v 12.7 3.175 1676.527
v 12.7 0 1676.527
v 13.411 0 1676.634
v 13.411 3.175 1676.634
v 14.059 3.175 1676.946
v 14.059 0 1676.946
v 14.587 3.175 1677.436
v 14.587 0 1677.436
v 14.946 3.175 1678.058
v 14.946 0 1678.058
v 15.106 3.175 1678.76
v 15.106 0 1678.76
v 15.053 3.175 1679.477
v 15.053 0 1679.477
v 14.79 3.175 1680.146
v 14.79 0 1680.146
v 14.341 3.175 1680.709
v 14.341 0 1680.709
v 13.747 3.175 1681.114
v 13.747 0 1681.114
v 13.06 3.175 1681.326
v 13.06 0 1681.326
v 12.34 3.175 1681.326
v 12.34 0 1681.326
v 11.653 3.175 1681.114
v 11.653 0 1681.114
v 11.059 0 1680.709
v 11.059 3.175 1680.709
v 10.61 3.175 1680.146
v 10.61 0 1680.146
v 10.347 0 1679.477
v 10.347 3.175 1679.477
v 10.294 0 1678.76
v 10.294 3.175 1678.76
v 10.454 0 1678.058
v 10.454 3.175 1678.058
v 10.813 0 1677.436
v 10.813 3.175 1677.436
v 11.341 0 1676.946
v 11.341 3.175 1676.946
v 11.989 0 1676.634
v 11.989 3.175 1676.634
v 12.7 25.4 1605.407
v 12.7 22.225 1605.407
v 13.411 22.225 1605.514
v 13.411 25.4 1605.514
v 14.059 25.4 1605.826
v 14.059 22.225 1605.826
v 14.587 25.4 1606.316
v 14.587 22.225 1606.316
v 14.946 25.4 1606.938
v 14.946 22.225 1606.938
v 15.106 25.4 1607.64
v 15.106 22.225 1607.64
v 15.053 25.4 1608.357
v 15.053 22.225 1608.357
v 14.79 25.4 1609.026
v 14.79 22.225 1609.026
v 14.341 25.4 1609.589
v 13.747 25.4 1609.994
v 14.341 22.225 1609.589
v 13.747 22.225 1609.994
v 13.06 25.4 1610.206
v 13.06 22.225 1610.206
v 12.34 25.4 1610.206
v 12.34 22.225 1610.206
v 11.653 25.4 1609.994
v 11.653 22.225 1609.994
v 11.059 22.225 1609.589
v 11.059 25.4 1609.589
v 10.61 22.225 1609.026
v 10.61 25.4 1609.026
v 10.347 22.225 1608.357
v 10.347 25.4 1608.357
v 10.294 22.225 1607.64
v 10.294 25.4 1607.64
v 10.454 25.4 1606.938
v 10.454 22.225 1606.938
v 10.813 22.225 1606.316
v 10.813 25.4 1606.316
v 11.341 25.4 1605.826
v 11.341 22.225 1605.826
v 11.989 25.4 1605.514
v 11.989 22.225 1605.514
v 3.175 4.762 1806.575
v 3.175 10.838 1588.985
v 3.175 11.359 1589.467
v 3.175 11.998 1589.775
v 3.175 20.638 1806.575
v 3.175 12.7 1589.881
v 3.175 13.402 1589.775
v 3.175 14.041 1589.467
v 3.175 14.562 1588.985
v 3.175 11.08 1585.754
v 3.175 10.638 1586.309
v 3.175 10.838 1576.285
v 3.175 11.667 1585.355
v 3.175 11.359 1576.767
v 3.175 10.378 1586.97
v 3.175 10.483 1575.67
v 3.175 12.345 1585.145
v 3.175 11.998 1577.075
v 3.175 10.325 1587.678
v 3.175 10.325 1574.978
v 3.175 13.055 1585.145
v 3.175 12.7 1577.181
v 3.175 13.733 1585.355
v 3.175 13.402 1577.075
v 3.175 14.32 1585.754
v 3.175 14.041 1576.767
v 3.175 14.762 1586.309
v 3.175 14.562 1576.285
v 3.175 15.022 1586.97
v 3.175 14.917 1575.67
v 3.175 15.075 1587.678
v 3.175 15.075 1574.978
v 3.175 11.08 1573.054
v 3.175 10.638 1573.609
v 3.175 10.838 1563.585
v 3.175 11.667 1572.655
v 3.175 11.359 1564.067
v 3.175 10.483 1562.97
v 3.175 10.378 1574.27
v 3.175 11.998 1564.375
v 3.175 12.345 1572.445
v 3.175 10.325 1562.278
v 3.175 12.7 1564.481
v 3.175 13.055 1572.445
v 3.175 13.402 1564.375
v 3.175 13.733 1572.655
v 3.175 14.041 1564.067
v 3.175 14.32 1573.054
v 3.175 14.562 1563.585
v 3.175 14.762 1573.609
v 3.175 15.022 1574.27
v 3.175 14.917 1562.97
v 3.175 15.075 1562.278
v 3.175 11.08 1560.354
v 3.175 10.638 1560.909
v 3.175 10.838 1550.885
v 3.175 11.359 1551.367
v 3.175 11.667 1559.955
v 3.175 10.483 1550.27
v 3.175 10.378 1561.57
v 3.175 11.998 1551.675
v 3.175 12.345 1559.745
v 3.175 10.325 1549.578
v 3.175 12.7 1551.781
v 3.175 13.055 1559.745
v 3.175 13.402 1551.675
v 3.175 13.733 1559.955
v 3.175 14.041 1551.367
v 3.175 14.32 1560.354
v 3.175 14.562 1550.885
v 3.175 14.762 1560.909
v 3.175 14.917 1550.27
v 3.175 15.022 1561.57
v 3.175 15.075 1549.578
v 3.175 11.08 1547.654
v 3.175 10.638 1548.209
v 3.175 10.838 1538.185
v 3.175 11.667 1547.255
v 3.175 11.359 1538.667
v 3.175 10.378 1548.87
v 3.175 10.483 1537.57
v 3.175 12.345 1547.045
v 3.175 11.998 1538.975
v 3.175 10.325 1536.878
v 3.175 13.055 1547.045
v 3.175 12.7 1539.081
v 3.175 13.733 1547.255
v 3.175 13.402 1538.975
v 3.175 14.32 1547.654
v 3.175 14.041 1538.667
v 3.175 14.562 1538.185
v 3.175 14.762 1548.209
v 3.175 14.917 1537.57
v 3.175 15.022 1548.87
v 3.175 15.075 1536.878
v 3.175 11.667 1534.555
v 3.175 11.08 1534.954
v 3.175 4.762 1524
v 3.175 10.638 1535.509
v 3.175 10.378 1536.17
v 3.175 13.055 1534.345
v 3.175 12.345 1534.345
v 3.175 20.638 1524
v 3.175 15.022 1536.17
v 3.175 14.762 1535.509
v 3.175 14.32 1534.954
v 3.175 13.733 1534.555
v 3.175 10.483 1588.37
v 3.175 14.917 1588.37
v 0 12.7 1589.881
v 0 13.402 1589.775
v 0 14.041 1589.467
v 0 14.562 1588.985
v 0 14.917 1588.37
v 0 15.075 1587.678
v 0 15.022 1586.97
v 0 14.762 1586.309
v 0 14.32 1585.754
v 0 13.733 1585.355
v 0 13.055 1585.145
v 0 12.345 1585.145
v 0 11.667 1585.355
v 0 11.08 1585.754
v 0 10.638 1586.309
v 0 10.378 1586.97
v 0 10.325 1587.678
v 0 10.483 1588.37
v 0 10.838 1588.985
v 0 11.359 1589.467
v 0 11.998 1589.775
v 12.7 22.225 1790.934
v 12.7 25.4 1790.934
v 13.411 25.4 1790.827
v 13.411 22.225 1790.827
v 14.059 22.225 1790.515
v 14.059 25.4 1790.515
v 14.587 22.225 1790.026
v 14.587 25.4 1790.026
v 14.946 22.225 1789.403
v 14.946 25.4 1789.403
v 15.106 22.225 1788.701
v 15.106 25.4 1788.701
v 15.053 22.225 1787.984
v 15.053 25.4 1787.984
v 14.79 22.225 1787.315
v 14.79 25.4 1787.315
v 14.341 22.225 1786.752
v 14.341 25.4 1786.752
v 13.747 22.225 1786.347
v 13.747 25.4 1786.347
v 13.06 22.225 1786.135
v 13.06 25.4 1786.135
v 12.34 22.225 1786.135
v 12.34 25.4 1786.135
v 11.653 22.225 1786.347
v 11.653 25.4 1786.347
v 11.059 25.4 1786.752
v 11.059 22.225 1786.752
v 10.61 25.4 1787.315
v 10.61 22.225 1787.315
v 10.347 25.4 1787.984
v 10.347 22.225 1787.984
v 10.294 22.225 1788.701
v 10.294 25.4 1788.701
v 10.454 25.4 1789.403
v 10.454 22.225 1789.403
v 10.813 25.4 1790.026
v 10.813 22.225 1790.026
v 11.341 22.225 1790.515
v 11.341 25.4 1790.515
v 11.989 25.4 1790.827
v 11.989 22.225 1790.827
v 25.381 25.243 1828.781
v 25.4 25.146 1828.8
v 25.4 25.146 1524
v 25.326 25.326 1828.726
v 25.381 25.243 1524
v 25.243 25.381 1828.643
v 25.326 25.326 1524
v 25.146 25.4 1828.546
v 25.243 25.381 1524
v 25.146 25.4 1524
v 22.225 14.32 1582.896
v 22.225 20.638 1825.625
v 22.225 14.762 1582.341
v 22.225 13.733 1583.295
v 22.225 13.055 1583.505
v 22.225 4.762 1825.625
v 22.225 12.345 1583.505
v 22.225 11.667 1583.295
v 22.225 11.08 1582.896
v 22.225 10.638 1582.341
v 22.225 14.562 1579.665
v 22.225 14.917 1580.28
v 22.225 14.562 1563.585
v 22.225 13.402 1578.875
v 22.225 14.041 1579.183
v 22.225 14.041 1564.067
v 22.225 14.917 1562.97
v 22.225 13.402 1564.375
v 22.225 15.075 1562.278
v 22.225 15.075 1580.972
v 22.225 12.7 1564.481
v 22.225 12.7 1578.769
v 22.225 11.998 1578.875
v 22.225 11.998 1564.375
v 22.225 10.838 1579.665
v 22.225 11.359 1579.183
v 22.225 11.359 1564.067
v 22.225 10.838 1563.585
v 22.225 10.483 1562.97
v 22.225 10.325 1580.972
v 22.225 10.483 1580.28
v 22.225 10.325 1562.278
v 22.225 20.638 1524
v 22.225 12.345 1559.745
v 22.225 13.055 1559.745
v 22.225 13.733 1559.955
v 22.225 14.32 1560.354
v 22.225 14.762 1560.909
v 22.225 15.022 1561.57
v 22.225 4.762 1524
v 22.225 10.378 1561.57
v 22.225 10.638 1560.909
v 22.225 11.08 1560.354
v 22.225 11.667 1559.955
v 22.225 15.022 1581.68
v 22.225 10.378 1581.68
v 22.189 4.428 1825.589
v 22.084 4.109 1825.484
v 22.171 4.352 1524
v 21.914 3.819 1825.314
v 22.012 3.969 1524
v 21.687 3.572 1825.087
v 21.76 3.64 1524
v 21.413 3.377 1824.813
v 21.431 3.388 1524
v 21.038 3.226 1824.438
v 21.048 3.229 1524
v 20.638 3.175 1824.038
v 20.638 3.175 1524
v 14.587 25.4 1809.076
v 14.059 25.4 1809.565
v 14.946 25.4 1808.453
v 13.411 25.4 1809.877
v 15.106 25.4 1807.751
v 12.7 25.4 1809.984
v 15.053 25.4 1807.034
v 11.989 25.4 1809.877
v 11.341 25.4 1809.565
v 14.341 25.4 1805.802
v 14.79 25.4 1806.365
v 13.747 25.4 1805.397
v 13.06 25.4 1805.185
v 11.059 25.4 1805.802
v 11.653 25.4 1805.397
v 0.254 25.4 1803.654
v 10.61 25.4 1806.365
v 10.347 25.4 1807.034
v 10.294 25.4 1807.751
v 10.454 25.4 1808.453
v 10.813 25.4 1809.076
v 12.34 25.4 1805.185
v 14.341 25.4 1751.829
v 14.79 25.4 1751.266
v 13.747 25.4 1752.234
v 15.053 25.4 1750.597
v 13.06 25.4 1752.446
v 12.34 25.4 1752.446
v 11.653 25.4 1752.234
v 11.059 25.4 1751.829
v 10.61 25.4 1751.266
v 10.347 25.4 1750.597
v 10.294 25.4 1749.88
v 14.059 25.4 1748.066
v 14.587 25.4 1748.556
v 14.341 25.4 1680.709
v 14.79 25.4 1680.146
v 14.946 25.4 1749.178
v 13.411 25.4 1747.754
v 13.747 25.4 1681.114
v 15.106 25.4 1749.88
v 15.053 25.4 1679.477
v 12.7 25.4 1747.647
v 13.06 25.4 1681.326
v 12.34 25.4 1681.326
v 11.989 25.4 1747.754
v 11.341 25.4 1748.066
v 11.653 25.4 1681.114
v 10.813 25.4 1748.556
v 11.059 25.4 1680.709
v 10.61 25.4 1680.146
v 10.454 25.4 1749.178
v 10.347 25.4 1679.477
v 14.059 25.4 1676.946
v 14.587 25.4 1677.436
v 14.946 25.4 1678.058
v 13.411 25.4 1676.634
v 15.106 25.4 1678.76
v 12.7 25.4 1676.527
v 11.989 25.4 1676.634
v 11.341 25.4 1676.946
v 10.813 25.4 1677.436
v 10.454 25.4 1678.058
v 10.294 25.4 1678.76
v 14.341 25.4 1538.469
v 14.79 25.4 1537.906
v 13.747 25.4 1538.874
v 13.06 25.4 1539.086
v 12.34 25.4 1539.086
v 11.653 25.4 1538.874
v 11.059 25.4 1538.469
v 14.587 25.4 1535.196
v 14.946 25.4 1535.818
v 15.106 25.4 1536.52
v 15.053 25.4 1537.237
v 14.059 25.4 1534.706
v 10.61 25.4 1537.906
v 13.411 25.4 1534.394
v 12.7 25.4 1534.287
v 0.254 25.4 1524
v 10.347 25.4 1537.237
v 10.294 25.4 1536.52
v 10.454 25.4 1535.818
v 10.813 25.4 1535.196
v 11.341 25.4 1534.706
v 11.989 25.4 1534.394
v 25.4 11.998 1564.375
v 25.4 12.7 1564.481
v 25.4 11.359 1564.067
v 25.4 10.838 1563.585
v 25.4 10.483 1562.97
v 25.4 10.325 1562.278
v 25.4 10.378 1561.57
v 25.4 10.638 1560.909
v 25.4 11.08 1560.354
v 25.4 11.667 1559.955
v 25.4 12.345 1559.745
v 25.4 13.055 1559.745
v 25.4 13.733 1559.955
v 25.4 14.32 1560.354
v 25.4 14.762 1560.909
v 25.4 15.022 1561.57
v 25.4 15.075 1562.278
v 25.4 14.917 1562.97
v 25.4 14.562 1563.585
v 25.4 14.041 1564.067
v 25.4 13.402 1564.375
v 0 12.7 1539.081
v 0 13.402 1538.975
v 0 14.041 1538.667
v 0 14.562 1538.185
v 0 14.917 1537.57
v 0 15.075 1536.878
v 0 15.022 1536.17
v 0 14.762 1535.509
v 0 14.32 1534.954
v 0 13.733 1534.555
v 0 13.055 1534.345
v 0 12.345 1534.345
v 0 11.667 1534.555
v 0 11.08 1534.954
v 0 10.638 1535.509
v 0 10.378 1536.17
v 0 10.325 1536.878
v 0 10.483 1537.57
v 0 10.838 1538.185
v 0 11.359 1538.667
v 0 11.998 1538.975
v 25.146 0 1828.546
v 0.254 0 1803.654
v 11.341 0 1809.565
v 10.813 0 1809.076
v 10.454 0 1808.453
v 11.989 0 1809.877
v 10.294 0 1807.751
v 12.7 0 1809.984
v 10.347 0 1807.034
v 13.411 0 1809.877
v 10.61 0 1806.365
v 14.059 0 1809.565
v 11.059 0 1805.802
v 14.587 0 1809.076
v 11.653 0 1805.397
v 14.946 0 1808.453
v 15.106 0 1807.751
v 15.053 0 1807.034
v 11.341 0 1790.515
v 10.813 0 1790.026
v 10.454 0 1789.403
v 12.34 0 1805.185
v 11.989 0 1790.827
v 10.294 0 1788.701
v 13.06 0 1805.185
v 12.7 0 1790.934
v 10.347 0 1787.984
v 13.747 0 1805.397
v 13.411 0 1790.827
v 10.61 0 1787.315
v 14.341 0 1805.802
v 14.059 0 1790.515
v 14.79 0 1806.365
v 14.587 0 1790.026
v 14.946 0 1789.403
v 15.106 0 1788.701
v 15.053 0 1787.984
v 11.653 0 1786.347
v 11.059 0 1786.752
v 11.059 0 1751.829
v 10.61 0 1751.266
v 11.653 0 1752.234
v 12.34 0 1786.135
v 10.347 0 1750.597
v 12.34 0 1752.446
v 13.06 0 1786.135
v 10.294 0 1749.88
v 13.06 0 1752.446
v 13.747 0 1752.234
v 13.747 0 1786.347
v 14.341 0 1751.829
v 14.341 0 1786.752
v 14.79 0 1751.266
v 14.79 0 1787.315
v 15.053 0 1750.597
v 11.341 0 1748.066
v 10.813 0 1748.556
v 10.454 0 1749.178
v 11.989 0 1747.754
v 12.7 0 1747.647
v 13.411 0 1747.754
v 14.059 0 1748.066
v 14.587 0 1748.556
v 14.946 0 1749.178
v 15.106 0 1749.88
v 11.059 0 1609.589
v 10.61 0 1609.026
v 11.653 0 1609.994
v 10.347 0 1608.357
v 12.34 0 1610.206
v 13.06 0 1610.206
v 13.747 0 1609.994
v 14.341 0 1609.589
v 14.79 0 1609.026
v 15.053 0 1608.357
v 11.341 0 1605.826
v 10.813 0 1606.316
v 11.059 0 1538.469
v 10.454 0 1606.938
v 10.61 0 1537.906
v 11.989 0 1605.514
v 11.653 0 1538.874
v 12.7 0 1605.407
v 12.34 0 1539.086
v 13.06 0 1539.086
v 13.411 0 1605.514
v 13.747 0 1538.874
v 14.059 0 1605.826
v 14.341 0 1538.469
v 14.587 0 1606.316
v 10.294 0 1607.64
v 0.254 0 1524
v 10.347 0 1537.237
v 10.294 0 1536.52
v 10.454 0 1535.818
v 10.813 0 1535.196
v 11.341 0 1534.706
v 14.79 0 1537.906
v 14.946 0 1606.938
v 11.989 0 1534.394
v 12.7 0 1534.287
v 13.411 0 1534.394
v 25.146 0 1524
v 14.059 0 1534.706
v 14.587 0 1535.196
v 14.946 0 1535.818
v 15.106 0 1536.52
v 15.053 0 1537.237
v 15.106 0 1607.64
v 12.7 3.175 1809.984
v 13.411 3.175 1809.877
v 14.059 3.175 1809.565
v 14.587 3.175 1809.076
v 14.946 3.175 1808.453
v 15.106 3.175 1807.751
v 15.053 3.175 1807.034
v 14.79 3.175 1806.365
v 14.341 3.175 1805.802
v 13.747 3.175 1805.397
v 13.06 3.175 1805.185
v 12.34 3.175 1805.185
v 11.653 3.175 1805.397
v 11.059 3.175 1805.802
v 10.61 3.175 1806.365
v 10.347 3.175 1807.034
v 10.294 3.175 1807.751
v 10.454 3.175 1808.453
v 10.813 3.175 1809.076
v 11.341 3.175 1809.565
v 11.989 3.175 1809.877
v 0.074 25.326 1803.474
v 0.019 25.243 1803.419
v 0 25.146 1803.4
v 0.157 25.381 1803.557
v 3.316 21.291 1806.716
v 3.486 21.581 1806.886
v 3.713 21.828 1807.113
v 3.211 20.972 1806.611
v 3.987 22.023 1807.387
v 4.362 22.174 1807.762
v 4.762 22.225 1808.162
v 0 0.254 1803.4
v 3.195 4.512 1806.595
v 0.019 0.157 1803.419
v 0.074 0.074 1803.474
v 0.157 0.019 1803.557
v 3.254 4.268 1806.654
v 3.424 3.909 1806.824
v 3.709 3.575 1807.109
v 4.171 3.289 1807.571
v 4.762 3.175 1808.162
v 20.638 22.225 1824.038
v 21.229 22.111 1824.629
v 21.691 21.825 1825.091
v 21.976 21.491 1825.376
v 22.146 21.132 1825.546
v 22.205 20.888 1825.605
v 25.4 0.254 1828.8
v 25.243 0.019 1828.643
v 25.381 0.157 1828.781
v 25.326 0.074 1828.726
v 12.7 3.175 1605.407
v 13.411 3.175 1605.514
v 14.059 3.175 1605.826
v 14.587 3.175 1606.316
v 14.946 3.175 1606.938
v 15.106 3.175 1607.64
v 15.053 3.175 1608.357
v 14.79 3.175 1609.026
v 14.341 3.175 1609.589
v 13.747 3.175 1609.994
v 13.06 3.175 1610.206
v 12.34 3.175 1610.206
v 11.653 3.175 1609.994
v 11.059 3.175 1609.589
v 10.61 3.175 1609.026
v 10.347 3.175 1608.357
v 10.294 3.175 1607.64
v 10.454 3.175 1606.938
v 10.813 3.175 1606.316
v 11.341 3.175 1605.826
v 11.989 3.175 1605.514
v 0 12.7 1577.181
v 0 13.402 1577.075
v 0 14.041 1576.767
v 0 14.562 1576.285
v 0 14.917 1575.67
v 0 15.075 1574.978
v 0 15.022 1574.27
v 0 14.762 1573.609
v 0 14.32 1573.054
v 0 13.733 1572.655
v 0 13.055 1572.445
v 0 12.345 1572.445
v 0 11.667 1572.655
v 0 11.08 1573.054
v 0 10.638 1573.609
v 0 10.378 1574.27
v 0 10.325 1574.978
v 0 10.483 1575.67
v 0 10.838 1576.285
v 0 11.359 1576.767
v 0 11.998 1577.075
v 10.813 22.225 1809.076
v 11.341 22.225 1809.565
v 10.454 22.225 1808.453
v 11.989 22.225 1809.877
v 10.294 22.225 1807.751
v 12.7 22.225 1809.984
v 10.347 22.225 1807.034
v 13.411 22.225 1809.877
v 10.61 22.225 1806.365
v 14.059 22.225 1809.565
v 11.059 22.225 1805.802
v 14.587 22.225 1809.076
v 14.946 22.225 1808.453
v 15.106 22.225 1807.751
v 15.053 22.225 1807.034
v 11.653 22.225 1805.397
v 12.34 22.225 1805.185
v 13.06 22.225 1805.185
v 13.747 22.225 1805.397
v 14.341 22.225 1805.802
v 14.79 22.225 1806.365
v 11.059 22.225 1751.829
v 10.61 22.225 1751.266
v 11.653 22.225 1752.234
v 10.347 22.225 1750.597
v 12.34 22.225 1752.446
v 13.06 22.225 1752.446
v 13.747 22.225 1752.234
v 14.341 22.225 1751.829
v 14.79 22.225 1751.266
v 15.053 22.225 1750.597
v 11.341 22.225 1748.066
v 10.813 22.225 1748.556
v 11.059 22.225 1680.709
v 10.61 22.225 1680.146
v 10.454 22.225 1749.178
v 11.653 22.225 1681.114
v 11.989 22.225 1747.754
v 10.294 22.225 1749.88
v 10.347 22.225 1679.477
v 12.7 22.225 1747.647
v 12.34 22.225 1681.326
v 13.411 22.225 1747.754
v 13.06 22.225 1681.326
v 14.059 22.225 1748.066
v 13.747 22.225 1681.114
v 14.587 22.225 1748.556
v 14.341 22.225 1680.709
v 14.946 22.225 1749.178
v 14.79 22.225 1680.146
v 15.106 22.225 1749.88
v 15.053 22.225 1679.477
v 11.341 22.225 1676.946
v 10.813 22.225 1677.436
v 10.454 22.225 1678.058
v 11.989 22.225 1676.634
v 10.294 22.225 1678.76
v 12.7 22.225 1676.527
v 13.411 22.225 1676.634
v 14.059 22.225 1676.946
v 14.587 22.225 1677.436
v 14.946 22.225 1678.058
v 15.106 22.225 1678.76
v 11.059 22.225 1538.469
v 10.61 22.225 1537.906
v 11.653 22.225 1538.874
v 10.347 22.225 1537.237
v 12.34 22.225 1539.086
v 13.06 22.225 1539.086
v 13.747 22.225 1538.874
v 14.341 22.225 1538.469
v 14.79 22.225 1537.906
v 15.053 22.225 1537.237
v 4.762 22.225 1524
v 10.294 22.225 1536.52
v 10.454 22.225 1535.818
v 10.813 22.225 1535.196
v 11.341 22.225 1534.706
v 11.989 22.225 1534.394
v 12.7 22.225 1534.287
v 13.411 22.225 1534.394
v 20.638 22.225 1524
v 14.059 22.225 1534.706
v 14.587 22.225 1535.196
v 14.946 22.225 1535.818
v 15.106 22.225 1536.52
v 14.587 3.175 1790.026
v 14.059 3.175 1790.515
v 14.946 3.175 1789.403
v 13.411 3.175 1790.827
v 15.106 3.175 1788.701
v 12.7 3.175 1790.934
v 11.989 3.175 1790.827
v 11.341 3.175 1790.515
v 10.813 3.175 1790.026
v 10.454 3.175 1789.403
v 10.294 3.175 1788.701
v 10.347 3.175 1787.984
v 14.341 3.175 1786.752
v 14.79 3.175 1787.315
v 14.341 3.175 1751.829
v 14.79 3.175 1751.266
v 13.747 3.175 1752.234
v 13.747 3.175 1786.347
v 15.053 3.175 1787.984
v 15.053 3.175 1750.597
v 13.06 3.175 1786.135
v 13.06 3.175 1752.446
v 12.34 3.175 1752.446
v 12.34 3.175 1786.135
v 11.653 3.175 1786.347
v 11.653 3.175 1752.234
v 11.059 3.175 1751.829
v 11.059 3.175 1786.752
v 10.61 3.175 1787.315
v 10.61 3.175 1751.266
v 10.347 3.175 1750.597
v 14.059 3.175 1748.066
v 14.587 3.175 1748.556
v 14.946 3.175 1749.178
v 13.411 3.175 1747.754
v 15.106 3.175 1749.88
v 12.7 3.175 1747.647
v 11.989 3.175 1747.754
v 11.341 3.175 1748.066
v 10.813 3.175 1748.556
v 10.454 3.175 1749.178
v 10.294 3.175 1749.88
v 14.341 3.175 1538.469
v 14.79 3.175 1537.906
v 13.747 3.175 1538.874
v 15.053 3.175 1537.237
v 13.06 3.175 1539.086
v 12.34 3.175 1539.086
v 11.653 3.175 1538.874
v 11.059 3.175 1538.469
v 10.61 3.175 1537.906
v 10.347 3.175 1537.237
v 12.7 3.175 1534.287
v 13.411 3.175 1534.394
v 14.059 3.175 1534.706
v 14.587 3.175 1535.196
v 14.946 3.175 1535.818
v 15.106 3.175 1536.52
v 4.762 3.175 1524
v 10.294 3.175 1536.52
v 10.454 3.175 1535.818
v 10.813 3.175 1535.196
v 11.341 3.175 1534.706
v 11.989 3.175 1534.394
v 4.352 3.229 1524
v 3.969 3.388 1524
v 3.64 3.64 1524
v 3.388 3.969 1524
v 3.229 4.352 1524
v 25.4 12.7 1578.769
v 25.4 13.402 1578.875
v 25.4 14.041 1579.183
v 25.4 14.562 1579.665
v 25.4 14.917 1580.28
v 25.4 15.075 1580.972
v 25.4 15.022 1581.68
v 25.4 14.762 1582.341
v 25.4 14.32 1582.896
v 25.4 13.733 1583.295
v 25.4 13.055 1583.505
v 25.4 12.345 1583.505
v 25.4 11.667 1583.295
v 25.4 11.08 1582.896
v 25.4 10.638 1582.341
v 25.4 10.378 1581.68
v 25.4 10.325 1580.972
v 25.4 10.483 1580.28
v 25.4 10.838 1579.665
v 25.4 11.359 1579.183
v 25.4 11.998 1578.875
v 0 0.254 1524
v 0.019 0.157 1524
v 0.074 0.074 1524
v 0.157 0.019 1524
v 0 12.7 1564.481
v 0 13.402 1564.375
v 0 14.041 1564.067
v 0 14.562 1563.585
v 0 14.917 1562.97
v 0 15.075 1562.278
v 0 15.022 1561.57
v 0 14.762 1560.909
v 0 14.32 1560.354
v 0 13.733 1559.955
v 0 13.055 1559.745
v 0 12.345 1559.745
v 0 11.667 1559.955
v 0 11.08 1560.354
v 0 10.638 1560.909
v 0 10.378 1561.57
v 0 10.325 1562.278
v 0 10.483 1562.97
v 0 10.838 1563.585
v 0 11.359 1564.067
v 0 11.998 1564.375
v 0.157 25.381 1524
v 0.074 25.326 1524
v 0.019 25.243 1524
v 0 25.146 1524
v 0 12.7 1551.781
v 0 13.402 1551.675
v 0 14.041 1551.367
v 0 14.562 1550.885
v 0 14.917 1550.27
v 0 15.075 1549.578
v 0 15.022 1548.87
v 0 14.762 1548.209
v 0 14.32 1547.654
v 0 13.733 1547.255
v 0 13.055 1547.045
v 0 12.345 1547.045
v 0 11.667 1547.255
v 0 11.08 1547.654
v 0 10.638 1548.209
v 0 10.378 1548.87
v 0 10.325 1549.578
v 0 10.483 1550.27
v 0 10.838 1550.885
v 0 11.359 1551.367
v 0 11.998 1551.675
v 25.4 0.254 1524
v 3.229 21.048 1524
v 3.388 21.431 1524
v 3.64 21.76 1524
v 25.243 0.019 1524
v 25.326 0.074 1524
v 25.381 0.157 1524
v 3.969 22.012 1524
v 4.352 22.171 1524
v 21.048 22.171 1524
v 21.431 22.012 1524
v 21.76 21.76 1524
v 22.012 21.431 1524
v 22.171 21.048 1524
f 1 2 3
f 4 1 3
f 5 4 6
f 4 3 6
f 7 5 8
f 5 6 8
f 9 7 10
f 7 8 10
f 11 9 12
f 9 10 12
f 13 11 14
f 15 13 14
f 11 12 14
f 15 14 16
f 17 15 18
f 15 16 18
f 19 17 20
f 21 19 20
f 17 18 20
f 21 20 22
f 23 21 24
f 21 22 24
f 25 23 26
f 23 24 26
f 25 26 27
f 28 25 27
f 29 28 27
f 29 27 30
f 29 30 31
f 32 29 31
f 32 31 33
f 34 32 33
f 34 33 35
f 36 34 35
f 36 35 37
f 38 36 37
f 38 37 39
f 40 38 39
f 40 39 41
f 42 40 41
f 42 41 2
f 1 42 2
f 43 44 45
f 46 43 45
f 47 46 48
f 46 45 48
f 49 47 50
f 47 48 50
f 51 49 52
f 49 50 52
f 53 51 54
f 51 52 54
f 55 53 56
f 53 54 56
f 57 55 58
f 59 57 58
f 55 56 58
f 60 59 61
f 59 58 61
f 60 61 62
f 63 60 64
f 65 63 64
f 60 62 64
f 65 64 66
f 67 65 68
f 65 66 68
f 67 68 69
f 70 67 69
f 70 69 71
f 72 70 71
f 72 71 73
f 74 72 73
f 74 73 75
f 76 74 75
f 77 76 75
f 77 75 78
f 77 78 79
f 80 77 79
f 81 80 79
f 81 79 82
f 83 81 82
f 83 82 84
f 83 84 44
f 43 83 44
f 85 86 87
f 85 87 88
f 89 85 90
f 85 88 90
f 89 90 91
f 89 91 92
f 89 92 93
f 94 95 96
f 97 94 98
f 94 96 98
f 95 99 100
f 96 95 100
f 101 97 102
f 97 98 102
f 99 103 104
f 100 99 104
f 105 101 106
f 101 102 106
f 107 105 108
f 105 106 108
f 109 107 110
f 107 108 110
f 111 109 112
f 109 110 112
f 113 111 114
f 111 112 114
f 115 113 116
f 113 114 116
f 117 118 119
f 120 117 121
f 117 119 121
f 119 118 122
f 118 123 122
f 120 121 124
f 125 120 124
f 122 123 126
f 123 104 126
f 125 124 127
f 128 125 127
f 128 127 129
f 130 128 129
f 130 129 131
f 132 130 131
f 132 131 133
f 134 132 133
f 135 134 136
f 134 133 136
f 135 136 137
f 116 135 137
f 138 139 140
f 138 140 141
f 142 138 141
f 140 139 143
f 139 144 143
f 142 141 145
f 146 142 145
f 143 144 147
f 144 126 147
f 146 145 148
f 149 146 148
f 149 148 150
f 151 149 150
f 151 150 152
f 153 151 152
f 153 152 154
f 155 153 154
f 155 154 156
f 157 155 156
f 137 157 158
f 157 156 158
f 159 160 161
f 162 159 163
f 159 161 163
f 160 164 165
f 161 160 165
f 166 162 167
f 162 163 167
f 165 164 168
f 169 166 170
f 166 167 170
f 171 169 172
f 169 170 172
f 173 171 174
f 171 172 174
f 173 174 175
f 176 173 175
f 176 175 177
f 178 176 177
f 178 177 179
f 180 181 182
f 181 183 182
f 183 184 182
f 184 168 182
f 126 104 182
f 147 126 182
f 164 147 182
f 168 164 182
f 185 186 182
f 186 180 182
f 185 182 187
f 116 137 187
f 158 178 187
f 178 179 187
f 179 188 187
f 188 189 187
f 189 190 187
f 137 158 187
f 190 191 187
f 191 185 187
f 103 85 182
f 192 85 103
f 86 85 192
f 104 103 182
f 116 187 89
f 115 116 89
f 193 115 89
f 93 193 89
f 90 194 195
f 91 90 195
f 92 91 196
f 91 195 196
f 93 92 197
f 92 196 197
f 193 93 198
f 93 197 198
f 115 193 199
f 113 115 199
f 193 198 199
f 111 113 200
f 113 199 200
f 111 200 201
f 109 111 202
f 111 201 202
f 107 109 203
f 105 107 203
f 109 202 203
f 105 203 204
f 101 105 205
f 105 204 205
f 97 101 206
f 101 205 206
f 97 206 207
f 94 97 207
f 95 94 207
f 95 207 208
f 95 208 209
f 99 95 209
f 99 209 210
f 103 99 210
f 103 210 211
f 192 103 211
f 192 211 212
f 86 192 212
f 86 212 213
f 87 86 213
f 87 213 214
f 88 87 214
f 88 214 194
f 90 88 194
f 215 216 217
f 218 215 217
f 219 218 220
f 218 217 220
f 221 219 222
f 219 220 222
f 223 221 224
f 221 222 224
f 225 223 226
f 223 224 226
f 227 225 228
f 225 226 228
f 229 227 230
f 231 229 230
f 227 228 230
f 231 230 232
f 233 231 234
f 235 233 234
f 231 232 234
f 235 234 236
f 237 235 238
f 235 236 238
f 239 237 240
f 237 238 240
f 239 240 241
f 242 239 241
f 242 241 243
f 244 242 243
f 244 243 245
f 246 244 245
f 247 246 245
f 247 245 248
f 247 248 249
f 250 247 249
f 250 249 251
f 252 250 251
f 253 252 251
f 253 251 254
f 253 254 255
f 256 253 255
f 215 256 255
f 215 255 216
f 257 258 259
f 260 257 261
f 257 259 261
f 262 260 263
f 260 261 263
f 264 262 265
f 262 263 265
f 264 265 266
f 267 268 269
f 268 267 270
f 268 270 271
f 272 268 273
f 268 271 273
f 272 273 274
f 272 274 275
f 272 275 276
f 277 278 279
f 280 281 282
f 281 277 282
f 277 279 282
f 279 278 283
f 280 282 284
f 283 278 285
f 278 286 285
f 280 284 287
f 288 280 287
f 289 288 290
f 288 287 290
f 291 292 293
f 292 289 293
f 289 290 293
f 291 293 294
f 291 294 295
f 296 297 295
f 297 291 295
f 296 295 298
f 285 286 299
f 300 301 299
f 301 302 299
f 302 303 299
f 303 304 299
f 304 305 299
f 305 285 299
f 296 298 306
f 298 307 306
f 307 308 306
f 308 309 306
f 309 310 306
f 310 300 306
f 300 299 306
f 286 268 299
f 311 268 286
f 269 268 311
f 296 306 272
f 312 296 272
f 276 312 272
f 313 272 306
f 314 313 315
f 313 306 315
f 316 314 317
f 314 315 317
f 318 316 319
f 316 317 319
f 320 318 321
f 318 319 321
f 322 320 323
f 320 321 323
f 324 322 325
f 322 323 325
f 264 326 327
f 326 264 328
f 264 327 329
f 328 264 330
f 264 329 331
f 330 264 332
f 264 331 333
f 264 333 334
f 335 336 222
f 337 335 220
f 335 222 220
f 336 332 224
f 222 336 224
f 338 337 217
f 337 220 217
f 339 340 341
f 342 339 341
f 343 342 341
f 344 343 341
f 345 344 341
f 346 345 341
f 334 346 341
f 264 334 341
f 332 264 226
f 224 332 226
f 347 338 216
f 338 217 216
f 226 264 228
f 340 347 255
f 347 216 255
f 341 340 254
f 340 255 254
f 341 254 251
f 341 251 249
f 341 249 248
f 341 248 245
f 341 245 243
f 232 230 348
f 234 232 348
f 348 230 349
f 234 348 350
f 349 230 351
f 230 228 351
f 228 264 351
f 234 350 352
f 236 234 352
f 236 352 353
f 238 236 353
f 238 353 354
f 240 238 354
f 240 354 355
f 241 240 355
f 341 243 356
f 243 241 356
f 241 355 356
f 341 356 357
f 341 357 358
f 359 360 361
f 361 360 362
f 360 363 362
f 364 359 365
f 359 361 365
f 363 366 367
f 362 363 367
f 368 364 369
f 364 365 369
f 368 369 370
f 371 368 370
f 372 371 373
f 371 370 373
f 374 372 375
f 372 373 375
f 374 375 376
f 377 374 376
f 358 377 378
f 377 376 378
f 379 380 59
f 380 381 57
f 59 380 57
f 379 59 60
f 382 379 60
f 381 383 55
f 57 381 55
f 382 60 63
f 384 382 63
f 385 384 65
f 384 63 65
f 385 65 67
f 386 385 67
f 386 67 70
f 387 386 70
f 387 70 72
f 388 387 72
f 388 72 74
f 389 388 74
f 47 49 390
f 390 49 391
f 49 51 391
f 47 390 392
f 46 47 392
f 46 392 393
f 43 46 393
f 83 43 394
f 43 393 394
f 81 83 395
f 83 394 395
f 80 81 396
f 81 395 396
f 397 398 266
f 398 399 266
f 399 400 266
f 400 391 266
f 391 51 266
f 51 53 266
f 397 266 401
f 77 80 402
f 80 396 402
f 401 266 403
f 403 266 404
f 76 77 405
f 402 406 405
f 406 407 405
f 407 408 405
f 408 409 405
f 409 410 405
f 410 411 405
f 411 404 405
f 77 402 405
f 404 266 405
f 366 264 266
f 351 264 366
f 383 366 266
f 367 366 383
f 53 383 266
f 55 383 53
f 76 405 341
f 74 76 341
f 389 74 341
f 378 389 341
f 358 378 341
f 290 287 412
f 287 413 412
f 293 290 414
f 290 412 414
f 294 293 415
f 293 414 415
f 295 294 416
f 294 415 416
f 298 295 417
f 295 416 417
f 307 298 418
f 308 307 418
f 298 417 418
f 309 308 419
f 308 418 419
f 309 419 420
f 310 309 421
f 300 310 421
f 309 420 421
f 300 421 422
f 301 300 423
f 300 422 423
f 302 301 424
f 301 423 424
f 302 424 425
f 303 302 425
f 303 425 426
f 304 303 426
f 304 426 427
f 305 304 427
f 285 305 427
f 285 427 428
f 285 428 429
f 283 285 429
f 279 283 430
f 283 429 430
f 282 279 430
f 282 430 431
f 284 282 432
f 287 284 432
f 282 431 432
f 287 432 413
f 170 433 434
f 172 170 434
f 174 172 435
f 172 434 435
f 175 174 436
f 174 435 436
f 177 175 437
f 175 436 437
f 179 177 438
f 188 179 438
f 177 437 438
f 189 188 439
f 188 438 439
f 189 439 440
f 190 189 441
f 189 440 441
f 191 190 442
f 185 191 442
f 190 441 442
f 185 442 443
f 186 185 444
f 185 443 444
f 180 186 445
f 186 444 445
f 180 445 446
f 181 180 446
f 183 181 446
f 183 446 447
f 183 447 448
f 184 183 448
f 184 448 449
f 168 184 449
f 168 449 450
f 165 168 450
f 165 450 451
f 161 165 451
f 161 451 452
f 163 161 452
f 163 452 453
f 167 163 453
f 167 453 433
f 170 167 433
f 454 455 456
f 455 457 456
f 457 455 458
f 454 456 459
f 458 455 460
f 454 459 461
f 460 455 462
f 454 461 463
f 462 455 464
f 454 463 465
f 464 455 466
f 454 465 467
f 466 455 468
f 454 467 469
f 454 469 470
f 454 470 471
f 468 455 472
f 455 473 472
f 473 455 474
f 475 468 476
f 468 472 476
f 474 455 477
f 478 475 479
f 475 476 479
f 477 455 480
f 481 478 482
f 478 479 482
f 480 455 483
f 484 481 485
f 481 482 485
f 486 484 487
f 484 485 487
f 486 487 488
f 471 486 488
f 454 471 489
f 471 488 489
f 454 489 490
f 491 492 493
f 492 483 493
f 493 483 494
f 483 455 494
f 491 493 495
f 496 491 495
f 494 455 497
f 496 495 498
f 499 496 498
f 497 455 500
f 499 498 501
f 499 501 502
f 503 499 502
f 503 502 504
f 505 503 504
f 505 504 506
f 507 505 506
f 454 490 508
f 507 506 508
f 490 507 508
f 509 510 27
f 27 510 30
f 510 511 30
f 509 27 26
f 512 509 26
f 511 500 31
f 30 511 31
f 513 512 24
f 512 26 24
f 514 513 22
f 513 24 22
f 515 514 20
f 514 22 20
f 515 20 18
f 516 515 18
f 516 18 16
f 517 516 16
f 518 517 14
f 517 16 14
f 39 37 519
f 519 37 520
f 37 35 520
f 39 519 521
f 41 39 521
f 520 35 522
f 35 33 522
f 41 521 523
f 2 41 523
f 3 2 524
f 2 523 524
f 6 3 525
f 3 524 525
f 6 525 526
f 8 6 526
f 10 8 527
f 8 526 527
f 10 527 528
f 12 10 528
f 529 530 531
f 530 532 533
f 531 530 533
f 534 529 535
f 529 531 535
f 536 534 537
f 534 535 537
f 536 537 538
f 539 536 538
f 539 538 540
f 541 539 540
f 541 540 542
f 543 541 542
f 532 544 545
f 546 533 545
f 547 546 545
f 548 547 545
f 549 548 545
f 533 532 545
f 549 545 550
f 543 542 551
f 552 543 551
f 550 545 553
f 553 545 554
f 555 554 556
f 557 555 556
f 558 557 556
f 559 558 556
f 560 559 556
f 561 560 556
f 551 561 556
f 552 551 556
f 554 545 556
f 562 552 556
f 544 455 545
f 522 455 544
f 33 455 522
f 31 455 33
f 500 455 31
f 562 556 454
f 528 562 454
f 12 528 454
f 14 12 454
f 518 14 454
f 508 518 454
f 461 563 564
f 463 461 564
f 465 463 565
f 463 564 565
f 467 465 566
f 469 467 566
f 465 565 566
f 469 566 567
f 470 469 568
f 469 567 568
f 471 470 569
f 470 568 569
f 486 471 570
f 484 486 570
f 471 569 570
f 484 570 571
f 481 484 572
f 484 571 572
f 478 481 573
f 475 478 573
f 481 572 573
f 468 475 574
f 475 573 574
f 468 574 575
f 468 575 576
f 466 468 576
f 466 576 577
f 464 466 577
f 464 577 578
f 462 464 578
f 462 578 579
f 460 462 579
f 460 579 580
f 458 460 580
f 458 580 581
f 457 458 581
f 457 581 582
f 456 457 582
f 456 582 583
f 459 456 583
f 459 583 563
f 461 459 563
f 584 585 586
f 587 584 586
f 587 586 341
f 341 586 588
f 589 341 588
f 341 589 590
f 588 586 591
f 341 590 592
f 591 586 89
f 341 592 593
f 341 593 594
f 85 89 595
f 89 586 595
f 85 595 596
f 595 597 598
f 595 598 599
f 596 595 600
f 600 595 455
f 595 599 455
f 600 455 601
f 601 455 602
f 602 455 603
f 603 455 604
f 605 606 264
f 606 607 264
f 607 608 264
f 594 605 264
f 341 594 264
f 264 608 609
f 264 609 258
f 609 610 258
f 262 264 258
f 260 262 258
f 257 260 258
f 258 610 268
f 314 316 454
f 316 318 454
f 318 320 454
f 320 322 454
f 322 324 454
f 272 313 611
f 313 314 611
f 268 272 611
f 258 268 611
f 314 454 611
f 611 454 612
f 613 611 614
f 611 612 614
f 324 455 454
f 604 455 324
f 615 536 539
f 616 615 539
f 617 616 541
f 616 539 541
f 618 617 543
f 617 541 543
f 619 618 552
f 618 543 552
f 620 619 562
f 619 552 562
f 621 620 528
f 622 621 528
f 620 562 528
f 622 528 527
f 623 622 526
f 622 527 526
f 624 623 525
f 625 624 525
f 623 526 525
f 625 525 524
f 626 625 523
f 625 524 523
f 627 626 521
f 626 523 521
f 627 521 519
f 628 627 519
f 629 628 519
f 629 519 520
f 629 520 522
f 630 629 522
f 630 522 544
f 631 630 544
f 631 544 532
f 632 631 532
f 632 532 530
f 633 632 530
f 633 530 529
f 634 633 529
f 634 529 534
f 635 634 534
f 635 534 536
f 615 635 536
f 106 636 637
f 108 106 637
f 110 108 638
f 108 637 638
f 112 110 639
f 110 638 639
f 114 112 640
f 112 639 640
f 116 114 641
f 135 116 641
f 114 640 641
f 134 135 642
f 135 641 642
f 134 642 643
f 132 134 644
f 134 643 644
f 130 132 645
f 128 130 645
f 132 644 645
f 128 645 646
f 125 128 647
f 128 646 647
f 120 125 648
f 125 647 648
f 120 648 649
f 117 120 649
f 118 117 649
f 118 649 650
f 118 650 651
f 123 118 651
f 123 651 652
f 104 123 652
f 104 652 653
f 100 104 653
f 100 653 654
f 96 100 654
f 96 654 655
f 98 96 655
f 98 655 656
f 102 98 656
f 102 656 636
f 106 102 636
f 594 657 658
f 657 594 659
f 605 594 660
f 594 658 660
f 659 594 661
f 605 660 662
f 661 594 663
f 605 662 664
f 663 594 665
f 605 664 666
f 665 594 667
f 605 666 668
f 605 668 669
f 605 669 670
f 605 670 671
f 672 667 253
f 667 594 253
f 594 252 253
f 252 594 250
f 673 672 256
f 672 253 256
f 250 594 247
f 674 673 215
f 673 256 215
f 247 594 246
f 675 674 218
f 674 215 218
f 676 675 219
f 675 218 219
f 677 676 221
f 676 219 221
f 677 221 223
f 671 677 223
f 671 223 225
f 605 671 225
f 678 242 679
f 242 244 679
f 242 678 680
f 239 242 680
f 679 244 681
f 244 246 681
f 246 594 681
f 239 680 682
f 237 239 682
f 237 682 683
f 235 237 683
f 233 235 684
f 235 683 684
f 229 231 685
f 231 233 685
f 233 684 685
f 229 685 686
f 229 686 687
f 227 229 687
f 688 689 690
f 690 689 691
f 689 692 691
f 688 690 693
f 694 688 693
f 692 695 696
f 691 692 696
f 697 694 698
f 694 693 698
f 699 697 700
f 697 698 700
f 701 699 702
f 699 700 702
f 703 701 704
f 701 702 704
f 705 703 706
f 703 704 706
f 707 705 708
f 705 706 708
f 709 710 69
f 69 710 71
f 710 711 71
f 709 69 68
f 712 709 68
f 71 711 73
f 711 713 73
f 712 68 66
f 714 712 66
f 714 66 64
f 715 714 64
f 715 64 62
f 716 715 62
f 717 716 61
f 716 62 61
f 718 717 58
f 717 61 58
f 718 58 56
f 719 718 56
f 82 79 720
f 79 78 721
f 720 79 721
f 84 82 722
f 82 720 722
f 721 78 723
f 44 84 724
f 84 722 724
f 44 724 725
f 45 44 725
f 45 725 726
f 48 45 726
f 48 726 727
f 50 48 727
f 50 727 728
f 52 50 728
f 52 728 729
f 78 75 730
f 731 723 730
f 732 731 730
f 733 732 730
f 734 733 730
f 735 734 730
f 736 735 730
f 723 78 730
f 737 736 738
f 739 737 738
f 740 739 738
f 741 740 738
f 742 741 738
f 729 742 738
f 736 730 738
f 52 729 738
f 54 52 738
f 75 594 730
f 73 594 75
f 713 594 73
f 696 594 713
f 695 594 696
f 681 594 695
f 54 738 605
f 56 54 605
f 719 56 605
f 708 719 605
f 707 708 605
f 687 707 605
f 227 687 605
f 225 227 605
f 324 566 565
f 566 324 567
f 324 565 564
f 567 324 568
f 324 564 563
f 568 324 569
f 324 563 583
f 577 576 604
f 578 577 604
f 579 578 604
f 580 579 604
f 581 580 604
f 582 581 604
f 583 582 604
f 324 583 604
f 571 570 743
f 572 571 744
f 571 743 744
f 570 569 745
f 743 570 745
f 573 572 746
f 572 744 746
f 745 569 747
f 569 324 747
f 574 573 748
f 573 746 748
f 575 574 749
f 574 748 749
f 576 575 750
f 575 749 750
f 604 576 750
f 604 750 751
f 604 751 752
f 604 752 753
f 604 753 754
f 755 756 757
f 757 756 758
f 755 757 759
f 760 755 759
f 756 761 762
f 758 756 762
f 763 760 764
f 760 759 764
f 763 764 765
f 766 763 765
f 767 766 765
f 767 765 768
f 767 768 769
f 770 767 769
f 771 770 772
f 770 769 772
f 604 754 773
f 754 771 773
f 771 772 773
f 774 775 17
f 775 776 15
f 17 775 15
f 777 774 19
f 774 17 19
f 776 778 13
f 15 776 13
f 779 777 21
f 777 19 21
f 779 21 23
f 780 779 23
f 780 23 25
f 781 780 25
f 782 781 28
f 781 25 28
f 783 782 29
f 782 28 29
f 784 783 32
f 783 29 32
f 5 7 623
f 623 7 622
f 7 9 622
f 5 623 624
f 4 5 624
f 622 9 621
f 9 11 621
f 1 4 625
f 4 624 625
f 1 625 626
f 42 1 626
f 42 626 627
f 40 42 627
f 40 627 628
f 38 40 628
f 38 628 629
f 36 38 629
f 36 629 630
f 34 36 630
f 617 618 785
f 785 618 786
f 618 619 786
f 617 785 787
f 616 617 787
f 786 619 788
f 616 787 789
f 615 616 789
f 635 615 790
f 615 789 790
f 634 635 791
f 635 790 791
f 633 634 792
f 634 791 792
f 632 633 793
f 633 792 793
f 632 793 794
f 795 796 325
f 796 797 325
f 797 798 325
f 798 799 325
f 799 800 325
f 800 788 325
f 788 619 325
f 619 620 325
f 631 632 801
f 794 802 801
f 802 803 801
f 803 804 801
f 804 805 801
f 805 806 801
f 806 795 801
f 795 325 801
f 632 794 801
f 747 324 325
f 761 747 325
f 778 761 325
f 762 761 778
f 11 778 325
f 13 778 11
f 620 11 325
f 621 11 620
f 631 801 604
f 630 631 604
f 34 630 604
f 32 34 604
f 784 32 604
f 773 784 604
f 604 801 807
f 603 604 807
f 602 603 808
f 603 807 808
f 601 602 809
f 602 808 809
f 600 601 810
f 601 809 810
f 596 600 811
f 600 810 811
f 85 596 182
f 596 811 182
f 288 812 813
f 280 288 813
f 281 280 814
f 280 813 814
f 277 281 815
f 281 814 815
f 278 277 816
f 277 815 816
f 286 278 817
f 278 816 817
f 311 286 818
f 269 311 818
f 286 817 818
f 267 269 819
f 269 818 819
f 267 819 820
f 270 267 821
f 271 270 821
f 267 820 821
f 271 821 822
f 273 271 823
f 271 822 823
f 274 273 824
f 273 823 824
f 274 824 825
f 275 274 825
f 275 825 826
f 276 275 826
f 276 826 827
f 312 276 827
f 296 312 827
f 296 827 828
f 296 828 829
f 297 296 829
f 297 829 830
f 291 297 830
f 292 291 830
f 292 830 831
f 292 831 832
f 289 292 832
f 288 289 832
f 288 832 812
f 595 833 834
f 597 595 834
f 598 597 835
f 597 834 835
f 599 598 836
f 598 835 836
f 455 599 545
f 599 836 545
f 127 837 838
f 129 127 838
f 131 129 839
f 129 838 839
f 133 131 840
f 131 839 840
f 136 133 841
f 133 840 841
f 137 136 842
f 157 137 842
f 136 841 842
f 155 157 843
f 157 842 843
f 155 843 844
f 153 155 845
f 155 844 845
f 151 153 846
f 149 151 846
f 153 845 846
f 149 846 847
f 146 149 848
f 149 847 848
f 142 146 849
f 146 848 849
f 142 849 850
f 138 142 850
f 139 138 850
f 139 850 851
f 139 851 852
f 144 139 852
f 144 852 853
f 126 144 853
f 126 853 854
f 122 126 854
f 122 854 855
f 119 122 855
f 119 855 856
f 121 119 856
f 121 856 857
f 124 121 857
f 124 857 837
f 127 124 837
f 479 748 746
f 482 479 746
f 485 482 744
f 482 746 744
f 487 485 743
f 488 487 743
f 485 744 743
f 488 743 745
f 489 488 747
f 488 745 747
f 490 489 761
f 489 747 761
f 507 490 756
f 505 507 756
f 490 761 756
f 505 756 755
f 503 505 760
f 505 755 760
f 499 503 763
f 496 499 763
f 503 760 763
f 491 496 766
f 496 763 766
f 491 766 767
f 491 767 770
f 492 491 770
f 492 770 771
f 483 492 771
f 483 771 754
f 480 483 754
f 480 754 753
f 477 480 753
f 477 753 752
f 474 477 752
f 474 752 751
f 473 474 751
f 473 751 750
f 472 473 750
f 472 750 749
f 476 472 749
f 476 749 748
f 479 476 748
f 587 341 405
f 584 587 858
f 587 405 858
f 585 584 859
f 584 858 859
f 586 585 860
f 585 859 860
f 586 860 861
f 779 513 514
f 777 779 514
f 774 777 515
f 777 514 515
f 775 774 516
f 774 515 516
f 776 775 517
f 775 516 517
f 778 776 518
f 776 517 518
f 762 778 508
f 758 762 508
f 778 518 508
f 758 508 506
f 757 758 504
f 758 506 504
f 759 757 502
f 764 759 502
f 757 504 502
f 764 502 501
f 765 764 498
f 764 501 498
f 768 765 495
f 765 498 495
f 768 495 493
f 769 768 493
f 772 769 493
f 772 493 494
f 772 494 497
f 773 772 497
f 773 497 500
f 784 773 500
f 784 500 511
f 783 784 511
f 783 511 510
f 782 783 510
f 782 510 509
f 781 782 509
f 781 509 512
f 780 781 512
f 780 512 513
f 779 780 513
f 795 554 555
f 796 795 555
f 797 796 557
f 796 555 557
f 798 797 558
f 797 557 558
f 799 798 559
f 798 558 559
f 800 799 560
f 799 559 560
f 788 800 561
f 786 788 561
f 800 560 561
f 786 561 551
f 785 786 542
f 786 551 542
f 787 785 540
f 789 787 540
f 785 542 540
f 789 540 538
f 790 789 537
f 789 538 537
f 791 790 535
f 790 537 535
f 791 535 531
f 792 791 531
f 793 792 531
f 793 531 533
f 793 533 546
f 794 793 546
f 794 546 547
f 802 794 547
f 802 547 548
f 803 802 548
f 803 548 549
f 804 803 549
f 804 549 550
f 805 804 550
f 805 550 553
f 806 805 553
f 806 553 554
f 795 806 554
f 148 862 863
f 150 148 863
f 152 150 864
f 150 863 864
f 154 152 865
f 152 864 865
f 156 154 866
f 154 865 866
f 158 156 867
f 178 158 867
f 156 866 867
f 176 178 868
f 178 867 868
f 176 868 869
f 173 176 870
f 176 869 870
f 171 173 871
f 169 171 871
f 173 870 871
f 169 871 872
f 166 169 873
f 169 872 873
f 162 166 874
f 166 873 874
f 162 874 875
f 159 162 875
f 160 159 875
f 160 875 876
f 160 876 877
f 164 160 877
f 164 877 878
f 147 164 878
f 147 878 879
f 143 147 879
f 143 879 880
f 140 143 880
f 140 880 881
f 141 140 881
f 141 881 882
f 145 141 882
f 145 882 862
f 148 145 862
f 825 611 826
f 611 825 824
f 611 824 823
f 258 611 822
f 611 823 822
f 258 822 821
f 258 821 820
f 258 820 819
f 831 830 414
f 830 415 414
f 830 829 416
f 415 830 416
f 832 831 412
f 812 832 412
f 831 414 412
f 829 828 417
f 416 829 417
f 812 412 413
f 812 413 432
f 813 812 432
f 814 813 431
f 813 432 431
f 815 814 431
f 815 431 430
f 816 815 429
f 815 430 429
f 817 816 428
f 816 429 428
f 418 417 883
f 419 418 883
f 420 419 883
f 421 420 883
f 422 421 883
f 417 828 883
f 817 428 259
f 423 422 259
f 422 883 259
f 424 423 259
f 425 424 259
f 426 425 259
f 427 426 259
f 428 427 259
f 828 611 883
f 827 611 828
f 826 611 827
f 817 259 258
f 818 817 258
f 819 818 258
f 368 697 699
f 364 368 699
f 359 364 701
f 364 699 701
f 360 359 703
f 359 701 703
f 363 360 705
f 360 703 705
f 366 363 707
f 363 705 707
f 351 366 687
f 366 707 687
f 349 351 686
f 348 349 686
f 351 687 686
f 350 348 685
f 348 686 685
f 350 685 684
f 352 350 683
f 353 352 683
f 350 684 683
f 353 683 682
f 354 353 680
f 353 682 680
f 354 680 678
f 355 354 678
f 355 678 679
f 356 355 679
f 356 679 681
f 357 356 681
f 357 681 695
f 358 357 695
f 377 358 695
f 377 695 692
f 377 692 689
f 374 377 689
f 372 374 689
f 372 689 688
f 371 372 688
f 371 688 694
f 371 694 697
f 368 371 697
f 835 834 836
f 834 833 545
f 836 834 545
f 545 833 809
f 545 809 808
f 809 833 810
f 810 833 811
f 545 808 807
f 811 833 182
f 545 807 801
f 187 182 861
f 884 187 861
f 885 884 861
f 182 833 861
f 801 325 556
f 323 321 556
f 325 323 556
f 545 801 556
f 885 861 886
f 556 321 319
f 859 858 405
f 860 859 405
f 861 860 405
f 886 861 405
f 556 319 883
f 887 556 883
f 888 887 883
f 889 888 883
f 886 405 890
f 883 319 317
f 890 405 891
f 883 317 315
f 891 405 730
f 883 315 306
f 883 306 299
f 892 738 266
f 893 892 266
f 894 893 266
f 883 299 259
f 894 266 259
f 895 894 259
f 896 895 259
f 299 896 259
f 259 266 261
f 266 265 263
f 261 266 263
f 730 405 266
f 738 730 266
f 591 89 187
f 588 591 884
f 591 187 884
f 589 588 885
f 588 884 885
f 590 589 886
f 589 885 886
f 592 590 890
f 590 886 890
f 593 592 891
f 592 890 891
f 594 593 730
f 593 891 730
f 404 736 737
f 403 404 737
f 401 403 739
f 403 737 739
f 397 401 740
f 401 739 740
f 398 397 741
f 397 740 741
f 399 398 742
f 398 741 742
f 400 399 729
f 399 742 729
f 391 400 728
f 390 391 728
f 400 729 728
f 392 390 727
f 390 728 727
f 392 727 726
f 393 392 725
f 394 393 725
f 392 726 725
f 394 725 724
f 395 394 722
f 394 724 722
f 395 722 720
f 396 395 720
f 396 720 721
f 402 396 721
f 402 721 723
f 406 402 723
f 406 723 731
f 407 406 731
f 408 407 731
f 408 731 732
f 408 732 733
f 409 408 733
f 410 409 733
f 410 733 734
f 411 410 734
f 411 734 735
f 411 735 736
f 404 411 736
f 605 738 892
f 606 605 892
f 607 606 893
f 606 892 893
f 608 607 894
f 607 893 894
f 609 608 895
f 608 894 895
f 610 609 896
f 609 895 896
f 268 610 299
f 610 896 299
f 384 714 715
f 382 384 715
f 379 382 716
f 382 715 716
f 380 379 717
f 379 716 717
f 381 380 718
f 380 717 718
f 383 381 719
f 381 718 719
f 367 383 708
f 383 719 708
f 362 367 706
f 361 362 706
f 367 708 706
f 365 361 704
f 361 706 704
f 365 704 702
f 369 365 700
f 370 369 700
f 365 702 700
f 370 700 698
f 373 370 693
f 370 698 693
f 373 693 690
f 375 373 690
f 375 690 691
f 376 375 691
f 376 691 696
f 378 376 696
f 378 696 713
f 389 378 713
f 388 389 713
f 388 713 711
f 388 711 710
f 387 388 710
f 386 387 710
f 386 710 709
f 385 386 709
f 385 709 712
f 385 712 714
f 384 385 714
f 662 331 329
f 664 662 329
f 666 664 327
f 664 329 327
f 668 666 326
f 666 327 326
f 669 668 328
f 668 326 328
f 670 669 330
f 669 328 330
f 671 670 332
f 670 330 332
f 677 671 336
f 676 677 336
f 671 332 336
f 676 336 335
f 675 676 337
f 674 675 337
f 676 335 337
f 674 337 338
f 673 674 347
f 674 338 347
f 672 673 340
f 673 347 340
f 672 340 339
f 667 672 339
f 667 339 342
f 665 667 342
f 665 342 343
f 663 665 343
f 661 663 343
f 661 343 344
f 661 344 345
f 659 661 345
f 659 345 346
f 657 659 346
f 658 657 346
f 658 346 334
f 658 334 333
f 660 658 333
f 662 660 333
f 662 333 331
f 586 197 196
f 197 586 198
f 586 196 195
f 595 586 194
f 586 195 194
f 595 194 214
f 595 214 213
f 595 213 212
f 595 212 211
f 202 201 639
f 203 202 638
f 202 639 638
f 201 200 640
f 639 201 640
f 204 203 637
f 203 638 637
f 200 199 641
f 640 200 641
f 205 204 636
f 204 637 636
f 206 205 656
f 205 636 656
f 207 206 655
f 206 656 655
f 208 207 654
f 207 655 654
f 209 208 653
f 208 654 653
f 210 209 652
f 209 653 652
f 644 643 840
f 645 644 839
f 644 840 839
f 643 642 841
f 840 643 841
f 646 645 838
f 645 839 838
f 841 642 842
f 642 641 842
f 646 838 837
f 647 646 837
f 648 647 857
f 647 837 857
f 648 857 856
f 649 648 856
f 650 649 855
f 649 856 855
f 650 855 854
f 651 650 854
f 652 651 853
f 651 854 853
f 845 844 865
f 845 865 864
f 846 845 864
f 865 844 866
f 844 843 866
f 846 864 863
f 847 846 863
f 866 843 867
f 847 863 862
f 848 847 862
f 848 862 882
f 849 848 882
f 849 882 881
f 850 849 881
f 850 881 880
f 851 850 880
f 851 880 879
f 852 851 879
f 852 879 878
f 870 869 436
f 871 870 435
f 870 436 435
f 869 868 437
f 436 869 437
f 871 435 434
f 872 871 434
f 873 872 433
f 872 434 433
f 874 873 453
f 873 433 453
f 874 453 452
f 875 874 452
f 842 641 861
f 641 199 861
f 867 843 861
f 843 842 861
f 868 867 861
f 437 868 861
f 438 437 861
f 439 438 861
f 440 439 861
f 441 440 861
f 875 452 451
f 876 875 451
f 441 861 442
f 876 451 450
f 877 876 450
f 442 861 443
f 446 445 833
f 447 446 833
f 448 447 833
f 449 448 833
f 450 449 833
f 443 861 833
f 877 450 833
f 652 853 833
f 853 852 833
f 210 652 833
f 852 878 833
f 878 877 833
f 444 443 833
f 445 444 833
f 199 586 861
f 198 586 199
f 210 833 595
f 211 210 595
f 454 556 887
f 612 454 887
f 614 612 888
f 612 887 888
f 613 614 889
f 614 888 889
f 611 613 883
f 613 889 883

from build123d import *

# Parameters (mm, degrees)
CUT_EXTRUDE1_START = 1524
CUT_EXTRUDE1_DEPTH = 304.8
CUT_EXTRUDE2_START = -25.4
CUT_EXTRUDE2_DEPTH = 25.4
SKETCH3_R          = 2.413
CUT_EXTRUDE3_DEPTH = 1830.152743759
SKETCH4_R          = 2.413
CUT_EXTRUDE4_DEPTH = 1830.152743759
CUT_EXTRUDE5_REACH = 1831.153
SKETCH5_R          = 2.38125
CUT_EXTRUDE6_REACH = 1831.153
SKETCH6_R          = 2.38125


with BuildPart() as part:
    # Cut-Extrude1: read off the stored shape, not the designer's step
    # Cut-Extrude1 outline → Cut-Extrude1 (new body)
    with BuildSketch(Plane.XY.offset(CUT_EXTRUDE1_START)):
        with BuildLine():
            Line((0, 25.146), (0, 0.254))
            ThreePointArc((0, 0.254), (0.074394878, 0.074394878), (0.254, 0))
            Line((0.254, 0), (25.146, 0))
            ThreePointArc((25.146, 0), (25.325605122, 0.074394878), (25.4, 0.254))
            Line((25.4, 0.254), (25.4, 25.146))
            ThreePointArc((25.4, 25.146), (25.325605122, 25.325605122), (25.146, 25.4))
            Line((25.146, 25.4), (0.254, 25.4))
            ThreePointArc((0.254, 25.4), (0.074394878, 25.325605122), (0, 25.146))
        make_face()
        with BuildLine():
            ThreePointArc((4.7625, 3.175), (3.639967985, 3.639967985), (3.175, 4.7625))
            Line((3.175, 4.7625), (3.175, 20.6375))
            ThreePointArc((3.175, 20.6375), (3.639967985, 21.760032015), (4.7625, 22.225))
            Line((4.7625, 22.225), (20.6375, 22.225))
            ThreePointArc((20.6375, 22.225), (21.760032015, 21.760032015), (22.225, 20.6375))
            Line((22.225, 20.6375), (22.225, 4.7625))
            ThreePointArc((22.225, 4.7625), (21.760032015, 3.639967985), (20.6375, 3.175))
            Line((20.6375, 3.175), (4.7625, 3.175))
        make_face(mode=Mode.SUBTRACT)
    extrude(amount=CUT_EXTRUDE1_DEPTH)

    # Sketch2 → Cut-Extrude2 (cut)
    with BuildSketch(Plane(origin=(0, 25.4, 0), x_dir=(1, 0, 0), z_dir=(0, 1, 0)).offset(CUT_EXTRUDE2_START)):
        Polygon((-15.751867444, -1787.648132556), (56.090181524, -1859.490181524), (20.16915704, -1895.411206008), (-51.672891929, -1823.56915704), align=None)
    extrude(amount=CUT_EXTRUDE2_DEPTH, mode=Mode.SUBTRACT)

    # Sketch3 → Cut-Extrude3 (cut, through all)
    with BuildSketch(Plane.XZ):
        with Locations(Location((12.7, 1536.7, 0), (0, 0, 270))):
            Circle(SKETCH3_R)
        with Locations(Location((12.7, 1607.82, 0), (0, 0, 270))):
            Circle(SKETCH3_R)
        with Locations(Location((12.7, 1678.94, 0), (0, 0, 270))):
            Circle(SKETCH3_R)
        with Locations(Location((12.7, 1750.06, 0), (0, 0, 270))):
            Circle(SKETCH3_R)
    extrude(amount=-CUT_EXTRUDE3_DEPTH, mode=Mode.SUBTRACT)

    # Sketch4 → Cut-Extrude4 (cut, through all)
    with BuildSketch(Plane(origin=(0, 25.4, 0), x_dir=(1, 0, 0), z_dir=(0, 1, 0))):
        with Locations(Location((12.7, -1807.571024484, 0), (0, 0, 270))):
            Circle(SKETCH4_R)
        with Locations(Location((12.7, -1788.521024484, 0), (0, 0, 270))):
            Circle(SKETCH4_R)
    extrude(amount=-CUT_EXTRUDE4_DEPTH, mode=Mode.SUBTRACT)

    # Sketch5 → Cut-Extrude5 (cut, up to next)
    with BuildSketch(Plane.ZY, mode=Mode.PRIVATE) as cut_extrude5_sk1:
        with Locations((1536.7, 12.7)):
            Circle(SKETCH5_R)
    cut_extrude5_tool1 = extrude(cut_extrude5_sk1.sketch, amount=-CUT_EXTRUDE5_REACH, mode=Mode.PRIVATE) & part.part
    # Sketch5 → Cut-Extrude5 (cut, up to next)
    with BuildSketch(Plane.ZY, mode=Mode.PRIVATE) as cut_extrude5_sk2:
        with Locations((1549.4, 12.7)):
            Circle(SKETCH5_R)
    cut_extrude5_tool2 = extrude(cut_extrude5_sk2.sketch, amount=-CUT_EXTRUDE5_REACH, mode=Mode.PRIVATE) & part.part
    # Sketch5 → Cut-Extrude5 (cut, up to next)
    with BuildSketch(Plane.ZY, mode=Mode.PRIVATE) as cut_extrude5_sk3:
        with Locations((1562.1, 12.7)):
            Circle(SKETCH5_R)
    cut_extrude5_tool3 = extrude(cut_extrude5_sk3.sketch, amount=-CUT_EXTRUDE5_REACH, mode=Mode.PRIVATE) & part.part
    # Sketch5 → Cut-Extrude5 (cut, up to next)
    with BuildSketch(Plane.ZY, mode=Mode.PRIVATE) as cut_extrude5_sk4:
        with Locations((1574.8, 12.7)):
            Circle(SKETCH5_R)
    cut_extrude5_tool4 = extrude(cut_extrude5_sk4.sketch, amount=-CUT_EXTRUDE5_REACH, mode=Mode.PRIVATE) & part.part
    # Sketch5 → Cut-Extrude5 (cut, up to next)
    with BuildSketch(Plane.ZY, mode=Mode.PRIVATE) as cut_extrude5_sk5:
        with Locations((1587.5, 12.7)):
            Circle(SKETCH5_R)
    cut_extrude5_tool5 = extrude(cut_extrude5_sk5.sketch, amount=-CUT_EXTRUDE5_REACH, mode=Mode.PRIVATE) & part.part
    add(cut_extrude5_tool1.solids().sort_by_distance((0, 12.7, 1536.7))[0], mode=Mode.SUBTRACT)
    add(cut_extrude5_tool2.solids().sort_by_distance((0, 12.7, 1549.4))[0], mode=Mode.SUBTRACT)
    add(cut_extrude5_tool3.solids().sort_by_distance((0, 12.7, 1562.1))[0], mode=Mode.SUBTRACT)
    add(cut_extrude5_tool4.solids().sort_by_distance((0, 12.7, 1574.8))[0], mode=Mode.SUBTRACT)
    add(cut_extrude5_tool5.solids().sort_by_distance((0, 12.7, 1587.5))[0], mode=Mode.SUBTRACT)

    # Sketch6 → Cut-Extrude6 (cut, up to next)
    with BuildSketch(Plane(origin=(25.4, 0, 0), x_dir=(0, 0, -1), z_dir=(1, 0, 0)), mode=Mode.PRIVATE) as cut_extrude6_sk1:
        with Locations(Location((-1562.1, 12.7, 0), (0, 0, 180))):
            Circle(SKETCH6_R)
    cut_extrude6_tool1 = extrude(cut_extrude6_sk1.sketch, amount=-CUT_EXTRUDE6_REACH, mode=Mode.PRIVATE) & part.part
    # Sketch6 → Cut-Extrude6 (cut, up to next)
    with BuildSketch(Plane(origin=(25.4, 0, 0), x_dir=(0, 0, -1), z_dir=(1, 0, 0)), mode=Mode.PRIVATE) as cut_extrude6_sk2:
        with Locations((-1581.15, 12.7)):
            Circle(SKETCH6_R)
    cut_extrude6_tool2 = extrude(cut_extrude6_sk2.sketch, amount=-CUT_EXTRUDE6_REACH, mode=Mode.PRIVATE) & part.part
    add(cut_extrude6_tool1.solids().sort_by_distance((25.4, 12.7, 1562.1))[0], mode=Mode.SUBTRACT)
    add(cut_extrude6_tool2.solids().sort_by_distance((25.4, 12.7, 1581.15))[0], mode=Mode.SUBTRACT)


solid = part.part
